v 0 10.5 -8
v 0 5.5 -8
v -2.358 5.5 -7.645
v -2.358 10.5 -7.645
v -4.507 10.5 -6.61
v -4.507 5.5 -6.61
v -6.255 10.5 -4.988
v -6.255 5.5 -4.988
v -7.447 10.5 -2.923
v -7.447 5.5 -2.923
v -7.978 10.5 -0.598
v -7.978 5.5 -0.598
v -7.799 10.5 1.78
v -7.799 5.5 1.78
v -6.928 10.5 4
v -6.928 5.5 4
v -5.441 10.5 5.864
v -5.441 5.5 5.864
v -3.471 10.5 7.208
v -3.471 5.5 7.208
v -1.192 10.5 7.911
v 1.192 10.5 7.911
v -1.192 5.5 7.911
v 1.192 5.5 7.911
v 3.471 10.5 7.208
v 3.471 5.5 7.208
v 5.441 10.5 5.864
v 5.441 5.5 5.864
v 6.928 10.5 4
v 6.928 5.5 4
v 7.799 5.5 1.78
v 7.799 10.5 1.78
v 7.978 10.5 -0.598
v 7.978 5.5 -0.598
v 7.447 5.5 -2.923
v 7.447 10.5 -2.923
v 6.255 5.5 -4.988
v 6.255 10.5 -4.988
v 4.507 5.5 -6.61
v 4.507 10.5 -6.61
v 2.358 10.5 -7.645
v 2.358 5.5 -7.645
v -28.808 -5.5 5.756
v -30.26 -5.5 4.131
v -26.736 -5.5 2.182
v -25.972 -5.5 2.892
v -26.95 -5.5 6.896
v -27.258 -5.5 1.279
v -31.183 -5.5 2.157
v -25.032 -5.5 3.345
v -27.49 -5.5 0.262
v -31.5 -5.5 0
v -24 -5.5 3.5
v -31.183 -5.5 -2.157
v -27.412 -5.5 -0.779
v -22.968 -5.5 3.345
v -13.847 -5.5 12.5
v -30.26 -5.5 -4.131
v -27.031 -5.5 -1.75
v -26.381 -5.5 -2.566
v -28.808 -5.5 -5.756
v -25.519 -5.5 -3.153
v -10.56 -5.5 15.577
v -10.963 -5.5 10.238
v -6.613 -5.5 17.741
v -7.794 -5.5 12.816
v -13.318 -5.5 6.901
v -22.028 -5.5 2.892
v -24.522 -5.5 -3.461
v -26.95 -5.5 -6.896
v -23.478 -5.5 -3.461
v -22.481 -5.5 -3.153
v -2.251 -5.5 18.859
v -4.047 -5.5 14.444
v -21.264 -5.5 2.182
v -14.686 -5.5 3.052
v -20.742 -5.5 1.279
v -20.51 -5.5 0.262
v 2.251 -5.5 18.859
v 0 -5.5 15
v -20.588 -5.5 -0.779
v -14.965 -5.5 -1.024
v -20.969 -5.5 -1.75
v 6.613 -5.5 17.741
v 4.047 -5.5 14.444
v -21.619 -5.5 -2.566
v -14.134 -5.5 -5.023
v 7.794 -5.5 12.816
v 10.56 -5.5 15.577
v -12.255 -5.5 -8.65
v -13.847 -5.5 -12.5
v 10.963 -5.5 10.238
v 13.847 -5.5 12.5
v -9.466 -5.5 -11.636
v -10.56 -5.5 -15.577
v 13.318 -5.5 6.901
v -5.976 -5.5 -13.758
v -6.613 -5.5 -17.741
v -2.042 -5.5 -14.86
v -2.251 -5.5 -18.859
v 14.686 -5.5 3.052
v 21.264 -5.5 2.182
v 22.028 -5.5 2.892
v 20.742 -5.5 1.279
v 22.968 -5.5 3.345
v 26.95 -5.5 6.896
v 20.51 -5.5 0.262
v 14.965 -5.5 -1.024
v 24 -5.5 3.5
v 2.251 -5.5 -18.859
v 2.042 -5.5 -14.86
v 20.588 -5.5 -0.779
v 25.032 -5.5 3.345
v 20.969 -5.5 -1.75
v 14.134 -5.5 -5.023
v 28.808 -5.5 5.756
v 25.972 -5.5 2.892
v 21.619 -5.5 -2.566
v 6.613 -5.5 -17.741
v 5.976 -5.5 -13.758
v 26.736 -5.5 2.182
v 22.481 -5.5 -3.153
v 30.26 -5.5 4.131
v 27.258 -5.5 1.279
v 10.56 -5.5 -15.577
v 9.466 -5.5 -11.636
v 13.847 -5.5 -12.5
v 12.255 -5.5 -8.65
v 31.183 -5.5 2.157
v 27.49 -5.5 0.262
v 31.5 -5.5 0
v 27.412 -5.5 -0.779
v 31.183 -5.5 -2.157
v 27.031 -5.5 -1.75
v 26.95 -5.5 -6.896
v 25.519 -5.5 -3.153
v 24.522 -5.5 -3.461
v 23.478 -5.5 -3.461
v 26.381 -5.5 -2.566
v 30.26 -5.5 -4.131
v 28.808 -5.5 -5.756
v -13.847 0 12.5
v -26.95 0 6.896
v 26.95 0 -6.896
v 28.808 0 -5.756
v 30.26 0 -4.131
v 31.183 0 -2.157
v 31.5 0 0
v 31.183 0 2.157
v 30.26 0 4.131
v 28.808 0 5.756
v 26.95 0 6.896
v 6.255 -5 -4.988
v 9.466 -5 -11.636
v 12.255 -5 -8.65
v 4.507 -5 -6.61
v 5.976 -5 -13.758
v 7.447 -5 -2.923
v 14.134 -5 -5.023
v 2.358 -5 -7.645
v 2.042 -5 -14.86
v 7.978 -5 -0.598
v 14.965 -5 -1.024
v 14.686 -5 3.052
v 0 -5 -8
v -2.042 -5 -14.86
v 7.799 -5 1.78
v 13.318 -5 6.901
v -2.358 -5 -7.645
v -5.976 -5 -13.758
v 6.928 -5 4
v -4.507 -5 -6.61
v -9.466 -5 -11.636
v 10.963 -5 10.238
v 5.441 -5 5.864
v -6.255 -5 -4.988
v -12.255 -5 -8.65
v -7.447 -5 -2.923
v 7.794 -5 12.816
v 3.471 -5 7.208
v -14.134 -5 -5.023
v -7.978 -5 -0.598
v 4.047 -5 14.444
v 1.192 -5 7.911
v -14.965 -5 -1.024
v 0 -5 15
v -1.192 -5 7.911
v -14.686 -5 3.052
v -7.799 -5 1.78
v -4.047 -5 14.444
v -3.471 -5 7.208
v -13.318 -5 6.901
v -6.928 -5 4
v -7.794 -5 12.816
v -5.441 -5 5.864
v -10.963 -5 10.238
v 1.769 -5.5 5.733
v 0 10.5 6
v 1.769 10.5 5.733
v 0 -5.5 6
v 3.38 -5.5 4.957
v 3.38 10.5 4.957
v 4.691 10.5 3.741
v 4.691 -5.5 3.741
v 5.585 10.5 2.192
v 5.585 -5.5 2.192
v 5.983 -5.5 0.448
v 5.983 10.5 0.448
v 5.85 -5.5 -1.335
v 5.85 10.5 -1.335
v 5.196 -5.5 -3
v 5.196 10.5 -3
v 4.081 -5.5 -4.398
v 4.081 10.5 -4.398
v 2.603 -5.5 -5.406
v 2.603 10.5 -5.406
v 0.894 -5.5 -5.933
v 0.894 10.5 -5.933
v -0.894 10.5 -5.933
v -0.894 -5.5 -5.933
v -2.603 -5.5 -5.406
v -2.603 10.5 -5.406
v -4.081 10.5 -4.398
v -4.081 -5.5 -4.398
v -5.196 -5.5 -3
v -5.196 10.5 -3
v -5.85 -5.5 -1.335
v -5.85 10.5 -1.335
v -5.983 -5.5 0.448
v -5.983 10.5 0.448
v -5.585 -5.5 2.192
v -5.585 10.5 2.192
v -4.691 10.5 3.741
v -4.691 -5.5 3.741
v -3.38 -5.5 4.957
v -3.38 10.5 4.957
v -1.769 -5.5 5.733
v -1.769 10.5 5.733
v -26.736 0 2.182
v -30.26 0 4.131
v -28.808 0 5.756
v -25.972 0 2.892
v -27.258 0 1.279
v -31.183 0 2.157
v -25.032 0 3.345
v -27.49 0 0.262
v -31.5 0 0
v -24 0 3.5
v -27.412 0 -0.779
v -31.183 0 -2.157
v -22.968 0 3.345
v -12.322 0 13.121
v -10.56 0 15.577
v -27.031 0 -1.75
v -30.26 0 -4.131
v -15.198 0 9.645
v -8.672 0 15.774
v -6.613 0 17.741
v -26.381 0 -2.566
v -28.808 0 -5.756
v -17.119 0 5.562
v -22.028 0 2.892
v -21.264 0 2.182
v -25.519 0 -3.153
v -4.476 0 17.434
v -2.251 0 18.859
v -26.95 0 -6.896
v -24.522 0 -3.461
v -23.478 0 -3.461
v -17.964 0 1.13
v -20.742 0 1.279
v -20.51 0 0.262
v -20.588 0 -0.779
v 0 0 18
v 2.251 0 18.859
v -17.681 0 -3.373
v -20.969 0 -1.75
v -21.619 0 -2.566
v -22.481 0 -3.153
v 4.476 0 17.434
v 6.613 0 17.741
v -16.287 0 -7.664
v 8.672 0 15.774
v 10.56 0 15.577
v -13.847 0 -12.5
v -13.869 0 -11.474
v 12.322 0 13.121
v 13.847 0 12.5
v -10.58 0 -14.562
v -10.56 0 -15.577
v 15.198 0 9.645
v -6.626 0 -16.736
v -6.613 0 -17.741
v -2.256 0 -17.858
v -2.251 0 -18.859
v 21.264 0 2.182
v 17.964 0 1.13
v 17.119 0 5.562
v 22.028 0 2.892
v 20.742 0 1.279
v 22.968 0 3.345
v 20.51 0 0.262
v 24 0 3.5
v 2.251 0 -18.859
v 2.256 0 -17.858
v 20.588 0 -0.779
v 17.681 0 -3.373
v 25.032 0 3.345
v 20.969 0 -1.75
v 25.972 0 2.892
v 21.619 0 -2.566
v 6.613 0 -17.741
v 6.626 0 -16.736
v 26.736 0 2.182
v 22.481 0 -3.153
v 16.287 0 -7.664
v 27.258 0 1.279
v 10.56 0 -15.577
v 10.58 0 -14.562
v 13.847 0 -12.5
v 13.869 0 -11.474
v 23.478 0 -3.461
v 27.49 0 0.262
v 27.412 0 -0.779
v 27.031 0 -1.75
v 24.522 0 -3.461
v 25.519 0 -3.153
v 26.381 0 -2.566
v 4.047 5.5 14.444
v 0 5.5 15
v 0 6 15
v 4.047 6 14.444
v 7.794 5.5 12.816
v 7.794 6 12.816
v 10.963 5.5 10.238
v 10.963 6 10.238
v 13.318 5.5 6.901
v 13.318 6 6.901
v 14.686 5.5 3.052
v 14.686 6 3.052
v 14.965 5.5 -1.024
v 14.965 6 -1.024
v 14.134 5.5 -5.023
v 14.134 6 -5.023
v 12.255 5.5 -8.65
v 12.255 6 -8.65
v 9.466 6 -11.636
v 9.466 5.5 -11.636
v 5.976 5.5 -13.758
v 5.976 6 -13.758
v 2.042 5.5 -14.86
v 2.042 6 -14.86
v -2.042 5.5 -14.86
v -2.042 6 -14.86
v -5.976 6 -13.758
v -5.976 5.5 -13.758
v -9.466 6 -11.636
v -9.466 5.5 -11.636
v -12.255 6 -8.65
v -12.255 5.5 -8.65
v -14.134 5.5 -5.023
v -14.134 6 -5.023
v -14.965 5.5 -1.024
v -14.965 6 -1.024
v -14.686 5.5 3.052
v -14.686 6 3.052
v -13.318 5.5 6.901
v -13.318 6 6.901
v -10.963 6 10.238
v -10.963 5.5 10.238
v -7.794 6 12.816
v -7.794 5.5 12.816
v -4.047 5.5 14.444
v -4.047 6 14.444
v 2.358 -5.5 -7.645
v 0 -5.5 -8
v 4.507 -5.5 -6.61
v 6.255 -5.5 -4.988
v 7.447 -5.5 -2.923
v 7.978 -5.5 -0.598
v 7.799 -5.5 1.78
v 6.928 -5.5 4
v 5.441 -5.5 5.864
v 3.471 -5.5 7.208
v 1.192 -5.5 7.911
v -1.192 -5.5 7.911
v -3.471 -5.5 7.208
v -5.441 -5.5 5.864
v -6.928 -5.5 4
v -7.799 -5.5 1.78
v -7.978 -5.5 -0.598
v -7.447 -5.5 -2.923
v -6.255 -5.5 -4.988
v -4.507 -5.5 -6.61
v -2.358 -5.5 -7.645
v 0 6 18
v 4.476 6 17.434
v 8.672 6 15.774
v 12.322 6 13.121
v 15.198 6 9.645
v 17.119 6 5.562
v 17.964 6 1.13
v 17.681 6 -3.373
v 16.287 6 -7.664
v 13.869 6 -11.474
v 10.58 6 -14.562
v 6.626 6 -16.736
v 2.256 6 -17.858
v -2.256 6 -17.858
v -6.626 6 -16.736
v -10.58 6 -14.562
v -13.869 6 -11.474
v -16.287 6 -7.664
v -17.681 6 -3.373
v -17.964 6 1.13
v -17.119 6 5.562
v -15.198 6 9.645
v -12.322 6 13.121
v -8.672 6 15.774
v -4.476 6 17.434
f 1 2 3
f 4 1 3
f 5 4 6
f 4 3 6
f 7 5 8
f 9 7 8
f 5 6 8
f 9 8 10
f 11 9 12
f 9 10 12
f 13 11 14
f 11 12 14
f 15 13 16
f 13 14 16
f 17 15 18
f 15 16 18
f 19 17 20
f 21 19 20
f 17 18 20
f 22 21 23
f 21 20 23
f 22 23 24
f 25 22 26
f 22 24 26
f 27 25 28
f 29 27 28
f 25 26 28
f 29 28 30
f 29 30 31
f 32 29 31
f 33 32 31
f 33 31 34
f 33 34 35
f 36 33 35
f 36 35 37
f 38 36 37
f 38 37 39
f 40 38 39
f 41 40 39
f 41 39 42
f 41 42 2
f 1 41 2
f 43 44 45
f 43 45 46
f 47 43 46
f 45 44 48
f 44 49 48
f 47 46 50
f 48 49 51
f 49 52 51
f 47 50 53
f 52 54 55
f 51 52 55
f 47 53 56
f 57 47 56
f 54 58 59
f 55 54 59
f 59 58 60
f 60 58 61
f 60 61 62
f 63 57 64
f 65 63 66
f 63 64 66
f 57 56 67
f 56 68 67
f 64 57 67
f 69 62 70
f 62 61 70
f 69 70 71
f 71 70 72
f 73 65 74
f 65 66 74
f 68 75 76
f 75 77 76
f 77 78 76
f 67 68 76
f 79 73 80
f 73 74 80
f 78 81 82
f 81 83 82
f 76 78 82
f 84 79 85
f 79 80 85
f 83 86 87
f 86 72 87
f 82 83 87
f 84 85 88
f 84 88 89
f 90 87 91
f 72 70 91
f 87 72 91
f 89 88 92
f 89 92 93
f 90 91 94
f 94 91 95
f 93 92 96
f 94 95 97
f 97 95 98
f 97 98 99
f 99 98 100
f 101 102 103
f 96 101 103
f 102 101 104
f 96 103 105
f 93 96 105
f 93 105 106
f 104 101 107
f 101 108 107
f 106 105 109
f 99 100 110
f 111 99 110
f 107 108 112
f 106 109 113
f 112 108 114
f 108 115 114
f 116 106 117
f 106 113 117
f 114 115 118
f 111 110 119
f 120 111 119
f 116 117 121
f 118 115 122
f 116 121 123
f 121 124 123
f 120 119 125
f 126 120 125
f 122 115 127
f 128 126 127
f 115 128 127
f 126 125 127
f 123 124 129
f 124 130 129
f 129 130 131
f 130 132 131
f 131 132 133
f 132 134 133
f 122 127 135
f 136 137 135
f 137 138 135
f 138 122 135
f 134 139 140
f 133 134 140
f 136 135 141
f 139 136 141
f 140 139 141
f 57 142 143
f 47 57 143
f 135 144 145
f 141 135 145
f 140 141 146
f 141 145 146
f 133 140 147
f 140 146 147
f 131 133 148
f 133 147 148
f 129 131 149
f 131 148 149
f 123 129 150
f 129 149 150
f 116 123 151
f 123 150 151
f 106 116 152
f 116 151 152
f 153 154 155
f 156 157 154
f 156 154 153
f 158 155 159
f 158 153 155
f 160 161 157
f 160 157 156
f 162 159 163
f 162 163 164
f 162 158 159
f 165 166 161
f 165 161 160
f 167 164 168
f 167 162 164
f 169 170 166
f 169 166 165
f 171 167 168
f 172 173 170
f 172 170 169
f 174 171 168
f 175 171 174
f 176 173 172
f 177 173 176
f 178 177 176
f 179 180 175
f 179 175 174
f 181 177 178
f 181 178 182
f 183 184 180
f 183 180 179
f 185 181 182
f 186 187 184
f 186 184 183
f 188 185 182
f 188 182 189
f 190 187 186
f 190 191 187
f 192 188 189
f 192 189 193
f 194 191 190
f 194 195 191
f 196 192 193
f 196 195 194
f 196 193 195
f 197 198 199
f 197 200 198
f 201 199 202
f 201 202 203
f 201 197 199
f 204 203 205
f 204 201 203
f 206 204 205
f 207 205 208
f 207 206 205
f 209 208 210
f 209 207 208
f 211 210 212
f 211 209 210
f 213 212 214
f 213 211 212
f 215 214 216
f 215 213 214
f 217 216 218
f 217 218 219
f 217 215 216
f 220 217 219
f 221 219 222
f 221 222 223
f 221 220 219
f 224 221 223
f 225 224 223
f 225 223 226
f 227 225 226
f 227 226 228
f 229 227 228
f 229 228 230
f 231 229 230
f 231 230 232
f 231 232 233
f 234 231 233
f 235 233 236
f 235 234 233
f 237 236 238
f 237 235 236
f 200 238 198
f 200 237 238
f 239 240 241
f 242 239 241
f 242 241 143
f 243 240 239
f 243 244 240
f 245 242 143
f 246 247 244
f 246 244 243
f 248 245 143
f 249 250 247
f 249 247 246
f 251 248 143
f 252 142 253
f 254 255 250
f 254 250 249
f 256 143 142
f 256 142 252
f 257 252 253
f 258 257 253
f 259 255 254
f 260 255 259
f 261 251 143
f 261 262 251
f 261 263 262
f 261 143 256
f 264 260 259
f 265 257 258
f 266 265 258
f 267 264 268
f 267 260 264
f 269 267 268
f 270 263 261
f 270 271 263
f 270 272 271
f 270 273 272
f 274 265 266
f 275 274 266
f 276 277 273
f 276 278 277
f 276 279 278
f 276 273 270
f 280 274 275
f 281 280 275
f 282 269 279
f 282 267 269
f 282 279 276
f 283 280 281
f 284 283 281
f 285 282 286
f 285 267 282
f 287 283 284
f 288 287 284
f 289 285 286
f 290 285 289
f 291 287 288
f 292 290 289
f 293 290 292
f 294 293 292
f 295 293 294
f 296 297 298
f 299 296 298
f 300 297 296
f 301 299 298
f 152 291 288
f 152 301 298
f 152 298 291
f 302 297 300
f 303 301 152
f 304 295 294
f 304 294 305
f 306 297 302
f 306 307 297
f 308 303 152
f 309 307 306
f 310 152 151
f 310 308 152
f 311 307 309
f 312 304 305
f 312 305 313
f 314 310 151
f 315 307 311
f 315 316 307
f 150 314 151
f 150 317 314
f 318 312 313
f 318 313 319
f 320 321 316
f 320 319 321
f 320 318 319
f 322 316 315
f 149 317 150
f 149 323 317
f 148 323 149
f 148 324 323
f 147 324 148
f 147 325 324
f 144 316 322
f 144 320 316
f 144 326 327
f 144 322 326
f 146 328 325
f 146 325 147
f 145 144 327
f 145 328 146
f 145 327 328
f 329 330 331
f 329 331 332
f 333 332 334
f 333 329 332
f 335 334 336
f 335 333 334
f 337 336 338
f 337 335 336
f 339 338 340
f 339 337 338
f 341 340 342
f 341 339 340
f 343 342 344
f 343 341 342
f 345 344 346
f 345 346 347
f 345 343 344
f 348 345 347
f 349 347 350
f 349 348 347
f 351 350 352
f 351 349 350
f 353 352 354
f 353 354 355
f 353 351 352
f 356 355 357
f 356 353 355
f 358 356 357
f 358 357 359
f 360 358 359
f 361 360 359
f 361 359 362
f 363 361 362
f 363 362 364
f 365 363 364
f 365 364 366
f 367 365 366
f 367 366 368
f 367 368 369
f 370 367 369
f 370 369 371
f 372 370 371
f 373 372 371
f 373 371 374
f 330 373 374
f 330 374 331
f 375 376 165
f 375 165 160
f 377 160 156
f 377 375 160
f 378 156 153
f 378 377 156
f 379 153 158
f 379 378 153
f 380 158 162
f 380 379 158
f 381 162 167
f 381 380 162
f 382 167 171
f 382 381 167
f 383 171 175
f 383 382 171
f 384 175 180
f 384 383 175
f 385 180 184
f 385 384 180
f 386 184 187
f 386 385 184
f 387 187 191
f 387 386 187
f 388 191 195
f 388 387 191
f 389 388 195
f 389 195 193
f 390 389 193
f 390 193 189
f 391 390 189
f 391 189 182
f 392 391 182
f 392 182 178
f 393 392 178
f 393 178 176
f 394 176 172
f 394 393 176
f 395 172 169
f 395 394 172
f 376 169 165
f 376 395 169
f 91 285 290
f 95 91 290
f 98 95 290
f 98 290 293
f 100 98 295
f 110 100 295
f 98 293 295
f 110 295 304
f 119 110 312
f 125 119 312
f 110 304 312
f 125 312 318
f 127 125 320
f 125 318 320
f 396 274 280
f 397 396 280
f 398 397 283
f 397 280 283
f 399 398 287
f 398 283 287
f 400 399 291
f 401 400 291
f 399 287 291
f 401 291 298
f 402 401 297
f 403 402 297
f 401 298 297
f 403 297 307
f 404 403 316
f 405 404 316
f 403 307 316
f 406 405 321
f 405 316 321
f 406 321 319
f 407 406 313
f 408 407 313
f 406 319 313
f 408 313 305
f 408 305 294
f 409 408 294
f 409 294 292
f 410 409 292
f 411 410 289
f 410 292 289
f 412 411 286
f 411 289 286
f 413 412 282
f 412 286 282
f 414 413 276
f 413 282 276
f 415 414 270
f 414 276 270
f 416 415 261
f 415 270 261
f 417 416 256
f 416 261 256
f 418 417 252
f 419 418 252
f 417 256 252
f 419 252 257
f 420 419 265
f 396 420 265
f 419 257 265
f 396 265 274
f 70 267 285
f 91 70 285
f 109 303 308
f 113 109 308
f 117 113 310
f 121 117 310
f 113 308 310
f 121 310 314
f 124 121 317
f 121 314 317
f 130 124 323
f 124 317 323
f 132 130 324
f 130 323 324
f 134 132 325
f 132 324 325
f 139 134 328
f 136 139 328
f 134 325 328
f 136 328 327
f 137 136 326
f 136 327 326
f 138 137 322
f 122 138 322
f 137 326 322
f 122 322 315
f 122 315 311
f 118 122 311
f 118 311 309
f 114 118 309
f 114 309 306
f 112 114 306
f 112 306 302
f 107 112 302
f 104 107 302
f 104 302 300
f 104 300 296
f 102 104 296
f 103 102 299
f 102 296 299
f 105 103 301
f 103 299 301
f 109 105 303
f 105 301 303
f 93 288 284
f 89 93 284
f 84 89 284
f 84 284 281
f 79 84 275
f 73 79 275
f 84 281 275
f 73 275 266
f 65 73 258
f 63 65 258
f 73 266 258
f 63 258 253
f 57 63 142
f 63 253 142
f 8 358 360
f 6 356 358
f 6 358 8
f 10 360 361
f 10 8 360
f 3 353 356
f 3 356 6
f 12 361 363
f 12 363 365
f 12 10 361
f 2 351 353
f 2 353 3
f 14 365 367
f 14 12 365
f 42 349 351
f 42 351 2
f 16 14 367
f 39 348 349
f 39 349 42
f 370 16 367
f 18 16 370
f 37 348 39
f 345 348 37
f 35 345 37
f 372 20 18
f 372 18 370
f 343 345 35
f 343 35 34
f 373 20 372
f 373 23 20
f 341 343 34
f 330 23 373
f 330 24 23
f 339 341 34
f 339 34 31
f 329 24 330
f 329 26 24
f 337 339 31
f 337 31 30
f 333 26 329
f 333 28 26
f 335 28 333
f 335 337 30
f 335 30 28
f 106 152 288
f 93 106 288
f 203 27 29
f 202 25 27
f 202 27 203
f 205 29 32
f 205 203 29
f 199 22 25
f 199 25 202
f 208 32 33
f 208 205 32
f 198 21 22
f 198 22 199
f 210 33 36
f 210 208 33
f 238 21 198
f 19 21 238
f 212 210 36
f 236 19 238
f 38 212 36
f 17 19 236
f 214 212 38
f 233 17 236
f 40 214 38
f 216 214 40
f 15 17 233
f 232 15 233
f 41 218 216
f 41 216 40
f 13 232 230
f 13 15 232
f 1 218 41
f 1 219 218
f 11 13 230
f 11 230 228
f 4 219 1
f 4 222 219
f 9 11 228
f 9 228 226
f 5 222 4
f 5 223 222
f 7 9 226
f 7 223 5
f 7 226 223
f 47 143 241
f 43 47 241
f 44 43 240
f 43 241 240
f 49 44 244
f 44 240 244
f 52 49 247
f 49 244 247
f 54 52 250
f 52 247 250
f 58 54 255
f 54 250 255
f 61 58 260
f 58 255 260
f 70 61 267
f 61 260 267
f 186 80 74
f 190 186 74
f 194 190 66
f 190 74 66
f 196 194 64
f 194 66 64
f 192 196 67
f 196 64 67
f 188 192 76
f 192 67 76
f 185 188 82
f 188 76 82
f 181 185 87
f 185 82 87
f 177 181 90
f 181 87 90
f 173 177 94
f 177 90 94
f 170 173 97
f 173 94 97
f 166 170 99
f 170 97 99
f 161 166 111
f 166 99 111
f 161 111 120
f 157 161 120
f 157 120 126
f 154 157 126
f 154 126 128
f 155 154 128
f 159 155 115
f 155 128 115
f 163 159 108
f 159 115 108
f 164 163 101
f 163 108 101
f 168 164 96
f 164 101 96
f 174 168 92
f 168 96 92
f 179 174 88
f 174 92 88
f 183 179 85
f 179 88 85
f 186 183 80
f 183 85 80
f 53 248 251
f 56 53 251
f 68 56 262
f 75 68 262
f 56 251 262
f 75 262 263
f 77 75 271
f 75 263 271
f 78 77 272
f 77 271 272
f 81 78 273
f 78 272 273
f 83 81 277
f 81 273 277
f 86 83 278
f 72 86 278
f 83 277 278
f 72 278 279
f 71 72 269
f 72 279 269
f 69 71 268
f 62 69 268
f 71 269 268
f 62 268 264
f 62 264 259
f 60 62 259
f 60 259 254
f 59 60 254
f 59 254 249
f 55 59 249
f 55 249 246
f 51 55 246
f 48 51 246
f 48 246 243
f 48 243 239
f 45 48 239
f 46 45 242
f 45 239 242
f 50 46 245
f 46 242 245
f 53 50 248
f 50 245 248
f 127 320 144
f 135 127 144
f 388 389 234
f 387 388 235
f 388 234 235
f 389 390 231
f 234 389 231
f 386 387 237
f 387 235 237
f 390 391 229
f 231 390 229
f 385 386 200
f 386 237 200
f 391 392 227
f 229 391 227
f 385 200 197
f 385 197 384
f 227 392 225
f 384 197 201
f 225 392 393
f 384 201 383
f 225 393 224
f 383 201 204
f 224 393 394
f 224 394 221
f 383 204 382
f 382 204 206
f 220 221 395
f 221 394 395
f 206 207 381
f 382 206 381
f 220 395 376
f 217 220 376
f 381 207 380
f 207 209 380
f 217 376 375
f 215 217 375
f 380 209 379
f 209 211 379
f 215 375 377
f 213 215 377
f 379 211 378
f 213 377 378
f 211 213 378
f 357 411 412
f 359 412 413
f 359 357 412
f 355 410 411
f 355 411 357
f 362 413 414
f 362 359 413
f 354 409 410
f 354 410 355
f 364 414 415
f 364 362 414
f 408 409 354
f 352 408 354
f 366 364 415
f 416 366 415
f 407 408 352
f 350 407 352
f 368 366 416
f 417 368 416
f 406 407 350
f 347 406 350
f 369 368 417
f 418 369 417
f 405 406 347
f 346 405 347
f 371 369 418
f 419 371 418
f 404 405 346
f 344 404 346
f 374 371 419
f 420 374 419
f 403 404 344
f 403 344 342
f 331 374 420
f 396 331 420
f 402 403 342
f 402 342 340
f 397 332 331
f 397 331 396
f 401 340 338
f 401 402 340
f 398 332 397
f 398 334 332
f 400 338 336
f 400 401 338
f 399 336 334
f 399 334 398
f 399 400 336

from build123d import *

# Parameters (mm, degrees)
SKETCH1_R           = 3.5
SKETCH1_R_2         = 6
BOSS_EXTRUDE1_DEPTH = 5.5
SKETCH1_3_R         = 18
SKETCH1_3_R_2       = 15
BOSS_EXTRUDE2_DEPTH = 6
SKETCH1_4_R         = 15
SKETCH1_4_R_2       = 8
BOSS_EXTRUDE3_DEPTH = 5.5
SKETCH1_5_R         = 8
SKETCH1_5_R_2       = 6
BOSS_EXTRUDE4_DEPTH = 10.5
SKETCH2_R           = 15
SKETCH2_R_2         = 8
CUT_EXTRUDE1_DEPTH  = 0.5


with BuildPart() as part:
    # Sketch1 → Boss-Extrude1 (new body)
    with BuildSketch(Plane(origin=(0, 0, 0), x_dir=(1, 0, 0), z_dir=(0, 1, 0))):
        with BuildLine():
            Line((-13.847382424, 12.5), (-26.949557882, 6.895658656))
            ThreePointArc((-26.949557882, 6.895658656), (-31.5, 0), (-26.949557882, -6.895658656))
            Line((-26.949557882, -6.895658656), (-13.847382424, -12.5))
            ThreePointArc((-13.847382424, -12.5), (0, -19), (13.847382424, -12.5))
            Line((13.847382424, -12.5), (26.949557882, -6.895658656))
            ThreePointArc((26.949557882, -6.895658656), (31.5, 0), (26.949557882, 6.895658656))
            Line((26.949557882, 6.895658656), (13.847382424, 12.5))
            ThreePointArc((13.847382424, 12.5), (0, 19), (-13.847382424, 12.5))
        make_face()
        with Locations((24, 0)):
            Circle(SKETCH1_R, mode=Mode.SUBTRACT)
        with Locations((-24, 0)):
            Circle(SKETCH1_R, mode=Mode.SUBTRACT)
        Circle(SKETCH1_R_2, mode=Mode.SUBTRACT)
    extrude(amount=-BOSS_EXTRUDE1_DEPTH)

    # Sketch1<3> → Boss-Extrude2 (add)
    with BuildSketch(Plane(origin=(0, 0, 0), x_dir=(1, 0, 0), z_dir=(0, 1, 0))):
        Circle(SKETCH1_3_R)
        Circle(SKETCH1_3_R_2, mode=Mode.SUBTRACT)
    extrude(amount=BOSS_EXTRUDE2_DEPTH)

    # Sketch1<4> → Boss-Extrude3 (add)
    with BuildSketch(Plane(origin=(0, 0, 0), x_dir=(1, 0, 0), z_dir=(0, 1, 0))):
        Circle(SKETCH1_4_R)
        Circle(SKETCH1_4_R_2, mode=Mode.SUBTRACT)
    extrude(amount=BOSS_EXTRUDE3_DEPTH)

    # Sketch1<5> → Boss-Extrude4 (add)
    with BuildSketch(Plane(origin=(0, 0, 0), x_dir=(1, 0, 0), z_dir=(0, 1, 0))):
        Circle(SKETCH1_5_R)
        Circle(SKETCH1_5_R_2, mode=Mode.SUBTRACT)
    extrude(amount=BOSS_EXTRUDE4_DEPTH)

    # Sketch2 → Cut-Extrude1 (cut)
    with BuildSketch(Plane.XZ.offset(5.5)):
        Circle(SKETCH2_R)
        Circle(SKETCH2_R_2, mode=Mode.SUBTRACT)
    extrude(amount=-CUT_EXTRUDE1_DEPTH, mode=Mode.SUBTRACT)


solid = part.part
